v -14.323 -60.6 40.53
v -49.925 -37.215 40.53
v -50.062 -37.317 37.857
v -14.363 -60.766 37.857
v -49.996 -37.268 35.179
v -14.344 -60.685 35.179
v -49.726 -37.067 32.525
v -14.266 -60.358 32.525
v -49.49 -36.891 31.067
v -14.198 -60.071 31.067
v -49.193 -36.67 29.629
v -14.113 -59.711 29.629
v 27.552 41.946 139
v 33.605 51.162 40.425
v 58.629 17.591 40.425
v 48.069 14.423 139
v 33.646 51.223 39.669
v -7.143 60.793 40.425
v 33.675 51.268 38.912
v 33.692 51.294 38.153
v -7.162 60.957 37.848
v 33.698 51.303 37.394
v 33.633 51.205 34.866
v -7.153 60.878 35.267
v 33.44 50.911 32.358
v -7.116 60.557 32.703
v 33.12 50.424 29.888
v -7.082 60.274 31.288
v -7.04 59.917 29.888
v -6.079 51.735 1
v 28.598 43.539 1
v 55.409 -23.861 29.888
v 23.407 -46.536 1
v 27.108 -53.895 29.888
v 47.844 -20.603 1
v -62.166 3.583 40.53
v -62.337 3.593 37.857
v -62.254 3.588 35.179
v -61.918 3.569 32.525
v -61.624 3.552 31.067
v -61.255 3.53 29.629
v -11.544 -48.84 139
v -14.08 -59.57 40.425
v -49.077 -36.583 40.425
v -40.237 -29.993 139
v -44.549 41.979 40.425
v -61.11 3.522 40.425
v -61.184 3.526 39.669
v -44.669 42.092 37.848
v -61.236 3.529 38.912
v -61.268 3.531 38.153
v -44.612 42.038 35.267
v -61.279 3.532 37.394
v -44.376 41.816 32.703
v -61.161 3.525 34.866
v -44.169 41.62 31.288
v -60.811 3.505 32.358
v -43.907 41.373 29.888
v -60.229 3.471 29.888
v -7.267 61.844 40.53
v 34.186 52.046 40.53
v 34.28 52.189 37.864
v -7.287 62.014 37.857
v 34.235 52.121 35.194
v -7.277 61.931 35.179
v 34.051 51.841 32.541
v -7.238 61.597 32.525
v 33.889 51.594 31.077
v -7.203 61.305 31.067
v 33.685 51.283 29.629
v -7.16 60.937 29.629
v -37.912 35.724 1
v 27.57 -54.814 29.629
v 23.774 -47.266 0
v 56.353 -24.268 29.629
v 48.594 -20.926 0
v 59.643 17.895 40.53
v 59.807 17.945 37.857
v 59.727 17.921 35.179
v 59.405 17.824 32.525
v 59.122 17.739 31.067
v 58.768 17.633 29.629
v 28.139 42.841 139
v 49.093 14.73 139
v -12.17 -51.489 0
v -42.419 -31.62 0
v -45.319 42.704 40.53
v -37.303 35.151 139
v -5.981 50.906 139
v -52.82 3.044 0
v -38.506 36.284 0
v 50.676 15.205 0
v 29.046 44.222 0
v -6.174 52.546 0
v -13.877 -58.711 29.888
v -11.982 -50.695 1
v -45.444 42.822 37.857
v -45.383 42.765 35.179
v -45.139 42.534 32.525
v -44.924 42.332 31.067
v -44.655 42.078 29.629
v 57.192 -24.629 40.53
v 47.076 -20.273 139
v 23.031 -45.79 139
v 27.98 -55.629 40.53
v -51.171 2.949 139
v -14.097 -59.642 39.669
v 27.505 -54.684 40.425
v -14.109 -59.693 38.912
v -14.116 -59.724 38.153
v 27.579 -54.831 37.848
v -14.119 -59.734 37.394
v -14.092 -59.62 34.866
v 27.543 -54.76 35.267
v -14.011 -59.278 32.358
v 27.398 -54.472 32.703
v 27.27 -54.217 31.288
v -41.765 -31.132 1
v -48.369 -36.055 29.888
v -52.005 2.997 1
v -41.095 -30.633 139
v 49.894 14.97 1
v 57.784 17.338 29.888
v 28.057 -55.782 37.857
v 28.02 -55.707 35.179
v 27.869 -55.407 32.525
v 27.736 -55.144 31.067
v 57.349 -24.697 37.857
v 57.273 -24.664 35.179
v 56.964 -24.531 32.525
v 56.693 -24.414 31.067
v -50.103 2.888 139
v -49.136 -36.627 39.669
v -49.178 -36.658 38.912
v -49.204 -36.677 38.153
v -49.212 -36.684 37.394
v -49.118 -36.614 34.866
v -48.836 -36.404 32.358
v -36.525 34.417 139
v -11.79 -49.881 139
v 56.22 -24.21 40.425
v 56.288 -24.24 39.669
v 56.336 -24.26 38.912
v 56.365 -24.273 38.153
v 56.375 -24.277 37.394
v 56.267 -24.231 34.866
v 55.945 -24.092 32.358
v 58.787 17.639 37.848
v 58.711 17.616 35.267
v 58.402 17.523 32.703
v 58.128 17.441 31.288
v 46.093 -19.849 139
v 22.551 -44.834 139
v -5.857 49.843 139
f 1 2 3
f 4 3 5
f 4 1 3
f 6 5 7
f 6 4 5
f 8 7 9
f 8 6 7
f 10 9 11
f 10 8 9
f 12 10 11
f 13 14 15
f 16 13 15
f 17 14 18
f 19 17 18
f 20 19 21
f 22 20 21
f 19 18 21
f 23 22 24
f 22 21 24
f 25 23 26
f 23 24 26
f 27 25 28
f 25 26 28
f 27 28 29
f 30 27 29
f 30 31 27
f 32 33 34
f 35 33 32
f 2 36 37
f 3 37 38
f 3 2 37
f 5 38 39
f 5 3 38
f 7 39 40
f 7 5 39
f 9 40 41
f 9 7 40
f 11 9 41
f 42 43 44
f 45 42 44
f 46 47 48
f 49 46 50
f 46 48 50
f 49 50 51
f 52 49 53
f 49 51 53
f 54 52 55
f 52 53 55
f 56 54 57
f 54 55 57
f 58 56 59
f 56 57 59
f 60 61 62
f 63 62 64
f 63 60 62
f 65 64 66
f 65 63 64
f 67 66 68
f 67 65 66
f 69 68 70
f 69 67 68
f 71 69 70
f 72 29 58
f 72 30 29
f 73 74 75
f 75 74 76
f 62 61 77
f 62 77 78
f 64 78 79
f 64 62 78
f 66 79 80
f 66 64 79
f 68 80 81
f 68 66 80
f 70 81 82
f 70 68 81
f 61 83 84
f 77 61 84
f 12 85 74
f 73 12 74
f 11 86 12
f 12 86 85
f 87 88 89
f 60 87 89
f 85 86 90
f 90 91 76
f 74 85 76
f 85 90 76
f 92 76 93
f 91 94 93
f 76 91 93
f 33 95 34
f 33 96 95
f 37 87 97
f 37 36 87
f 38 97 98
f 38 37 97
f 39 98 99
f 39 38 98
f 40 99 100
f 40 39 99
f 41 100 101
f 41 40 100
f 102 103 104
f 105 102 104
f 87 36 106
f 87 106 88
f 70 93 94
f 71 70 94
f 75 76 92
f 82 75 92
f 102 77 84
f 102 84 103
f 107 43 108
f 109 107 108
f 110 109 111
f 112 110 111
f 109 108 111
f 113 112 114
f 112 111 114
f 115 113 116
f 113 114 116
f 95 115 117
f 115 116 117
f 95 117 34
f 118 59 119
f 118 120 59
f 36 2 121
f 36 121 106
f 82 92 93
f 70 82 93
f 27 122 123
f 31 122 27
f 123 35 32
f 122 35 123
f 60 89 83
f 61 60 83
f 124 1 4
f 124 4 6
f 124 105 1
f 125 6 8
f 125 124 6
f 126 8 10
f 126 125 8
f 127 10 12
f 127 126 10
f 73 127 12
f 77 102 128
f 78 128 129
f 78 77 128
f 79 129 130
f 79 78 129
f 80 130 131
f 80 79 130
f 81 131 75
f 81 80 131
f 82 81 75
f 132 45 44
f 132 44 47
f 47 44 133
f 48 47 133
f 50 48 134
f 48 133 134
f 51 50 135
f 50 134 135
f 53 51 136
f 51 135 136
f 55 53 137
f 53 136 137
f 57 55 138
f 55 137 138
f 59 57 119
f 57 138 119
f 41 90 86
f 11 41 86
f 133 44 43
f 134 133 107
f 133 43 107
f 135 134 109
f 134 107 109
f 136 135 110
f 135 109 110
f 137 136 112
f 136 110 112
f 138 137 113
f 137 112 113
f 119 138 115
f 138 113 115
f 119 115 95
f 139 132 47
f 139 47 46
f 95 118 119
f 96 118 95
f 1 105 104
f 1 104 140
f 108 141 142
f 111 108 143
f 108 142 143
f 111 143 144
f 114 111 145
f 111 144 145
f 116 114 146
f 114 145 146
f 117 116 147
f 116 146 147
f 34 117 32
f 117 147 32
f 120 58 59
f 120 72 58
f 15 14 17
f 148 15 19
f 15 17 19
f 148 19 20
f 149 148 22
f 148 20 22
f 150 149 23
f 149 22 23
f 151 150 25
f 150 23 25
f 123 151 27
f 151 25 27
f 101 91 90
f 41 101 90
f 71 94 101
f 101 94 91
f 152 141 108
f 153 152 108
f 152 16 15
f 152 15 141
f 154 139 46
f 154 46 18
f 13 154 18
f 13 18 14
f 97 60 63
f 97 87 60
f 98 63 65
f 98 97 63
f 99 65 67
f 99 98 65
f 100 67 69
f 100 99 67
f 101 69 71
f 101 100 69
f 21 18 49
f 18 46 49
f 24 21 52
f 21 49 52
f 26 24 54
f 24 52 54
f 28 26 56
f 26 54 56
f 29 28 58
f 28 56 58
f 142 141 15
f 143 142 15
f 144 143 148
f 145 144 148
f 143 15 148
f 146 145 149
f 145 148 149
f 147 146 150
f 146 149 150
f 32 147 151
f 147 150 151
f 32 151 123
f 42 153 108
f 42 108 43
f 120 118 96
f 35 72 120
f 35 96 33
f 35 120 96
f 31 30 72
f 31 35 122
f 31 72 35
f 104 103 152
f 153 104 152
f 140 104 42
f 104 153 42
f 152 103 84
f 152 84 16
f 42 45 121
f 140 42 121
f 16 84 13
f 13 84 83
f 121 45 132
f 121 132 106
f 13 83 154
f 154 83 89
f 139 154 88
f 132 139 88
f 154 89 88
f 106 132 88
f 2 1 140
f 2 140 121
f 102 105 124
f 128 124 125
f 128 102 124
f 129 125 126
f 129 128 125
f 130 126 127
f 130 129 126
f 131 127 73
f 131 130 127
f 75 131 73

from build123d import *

# Parameters (mm, degrees)
SALIENTE_EXTRUIR4_DEPTH = 35
SALIENTE_EXTRUIR4_DRAFT = -15
SALIENTE_EXTRUIR5_DEPTH = 104
SALIENTE_EXTRUIR5_DRAFT = -6
REDONDEO1_R             = 30
VACIADO1_T              = -1


with BuildPart() as part:
    # Croquis1 → Saliente-Extruir4 (with draft: the straight prism first)
    with BuildSketch(Plane.XY):
        Polygon((23.773844097, -47.265828947), (48.59371037, -20.926193194), (50.676039503, 15.205040923), (29.04648655, 44.221667407), (-6.174240275, 52.546484242), (-38.505971456, 36.284217111), (-52.820330647, 3.04416154), (-42.419470096, -31.620291048), (-12.170068047, -51.489258034), align=None)
    extrude(amount=SALIENTE_EXTRUIR4_DEPTH)
    # Saliente-Extruir4: the draft: its side faces are tilted about the plane it starts from
    saliente_extruir4_sides = [part.faces().sort_by_distance(p)[0] for p in [
        (36.183777233, -34.09601107, 17.5),
        (49.634874936, -2.860576136, 17.5),
        (39.861263027, 29.713354165, 17.5),
        (11.436123138, 48.384075824, 17.5),
        (-22.340105865, 44.415350676, 17.5),
        (-45.663151051, 19.664189326, 17.5),
        (-47.619900371, -14.288064754, 17.5),
        (-27.294769071, -41.554774541, 17.5),
        (5.801888025, -49.37754349, 17.5),
    ]]
    draft(saliente_extruir4_sides, Plane.XY, SALIENTE_EXTRUIR4_DRAFT)


with BuildPart() as saliente_extruir5_tool:
    # Croquis12 → Saliente-Extruir5 (with draft: the straight prism first)
    with BuildSketch(Plane(origin=(0, 0, 35), x_dir=(-1, 0, 0), z_dir=(0, 0, -1))):
        Polygon((50.42110527, -37.584864214), (62.783892537, 3.618385358), (45.76939872, 43.128552207), (7.338894572, 62.458390158), (-34.525559909, 52.563253206), (-60.235121199, 18.073185904), (-57.759999842, -24.873525944), (-28.258332628, -56.181638564), (14.465722479, -61.201738111), align=None)
    extrude(amount=-SALIENTE_EXTRUIR5_DEPTH)
    # Saliente-Extruir5: the draft: its side faces are tilted about the plane it starts from
    saliente_extruir5_sides = [saliente_extruir5_tool.faces().sort_by_distance(p)[0] for p in [
        (-56.602498903, -16.983239428, 87),
        (-54.276645628, 23.373468782, 87),
        (-26.554146646, 52.793471182, 87),
        (13.593332668, 57.510821682, 87),
        (47.380340554, 35.318219555, 87),
        (58.997560521, -3.40017002, 87),
        (43.009166235, -40.527582254, 87),
        (6.896305074, -58.691688337, 87),
        (-32.443413875, -49.393301163, 87),
    ]]
    draft(saliente_extruir5_sides, Plane(origin=(0, 0, 35), x_dir=(-1, 0, 0), z_dir=(0, 0, -1)), SALIENTE_EXTRUIR5_DRAFT)


with BuildPart() as part_1:
    add(part.part)

    # Saliente-Extruir5: add saliente_extruir5_tool
    add(saliente_extruir5_tool.part)

    # Redondeo1
    redondeo1_edges = [part_1.edges().sort_by_distance(p)[0] for p in [
        (13.593332668, 57.510821682, 35),
        (-26.554146646, 52.793471182, 35),
        (-54.276645628, 23.373468782, 35),
        (-56.602498903, -16.983239428, 35),
        (-32.443413875, -49.393301163, 35),
        (6.896305074, -58.691688337, 35),
        (43.009166235, -40.527582254, 35),
        (58.997560521, -3.40017002, 35),
        (47.380340554, 35.318219555, 35),
    ]]
    fillet(redondeo1_edges, radius=REDONDEO1_R)

    # Vaciado1
    vaciado1_openings = [part_1.faces().sort_by_distance(p)[0] for p in [
        (0, 0, 139),
    ]]
    offset(amount=VACIADO1_T, openings=vaciado1_openings)


solid = part_1.part
